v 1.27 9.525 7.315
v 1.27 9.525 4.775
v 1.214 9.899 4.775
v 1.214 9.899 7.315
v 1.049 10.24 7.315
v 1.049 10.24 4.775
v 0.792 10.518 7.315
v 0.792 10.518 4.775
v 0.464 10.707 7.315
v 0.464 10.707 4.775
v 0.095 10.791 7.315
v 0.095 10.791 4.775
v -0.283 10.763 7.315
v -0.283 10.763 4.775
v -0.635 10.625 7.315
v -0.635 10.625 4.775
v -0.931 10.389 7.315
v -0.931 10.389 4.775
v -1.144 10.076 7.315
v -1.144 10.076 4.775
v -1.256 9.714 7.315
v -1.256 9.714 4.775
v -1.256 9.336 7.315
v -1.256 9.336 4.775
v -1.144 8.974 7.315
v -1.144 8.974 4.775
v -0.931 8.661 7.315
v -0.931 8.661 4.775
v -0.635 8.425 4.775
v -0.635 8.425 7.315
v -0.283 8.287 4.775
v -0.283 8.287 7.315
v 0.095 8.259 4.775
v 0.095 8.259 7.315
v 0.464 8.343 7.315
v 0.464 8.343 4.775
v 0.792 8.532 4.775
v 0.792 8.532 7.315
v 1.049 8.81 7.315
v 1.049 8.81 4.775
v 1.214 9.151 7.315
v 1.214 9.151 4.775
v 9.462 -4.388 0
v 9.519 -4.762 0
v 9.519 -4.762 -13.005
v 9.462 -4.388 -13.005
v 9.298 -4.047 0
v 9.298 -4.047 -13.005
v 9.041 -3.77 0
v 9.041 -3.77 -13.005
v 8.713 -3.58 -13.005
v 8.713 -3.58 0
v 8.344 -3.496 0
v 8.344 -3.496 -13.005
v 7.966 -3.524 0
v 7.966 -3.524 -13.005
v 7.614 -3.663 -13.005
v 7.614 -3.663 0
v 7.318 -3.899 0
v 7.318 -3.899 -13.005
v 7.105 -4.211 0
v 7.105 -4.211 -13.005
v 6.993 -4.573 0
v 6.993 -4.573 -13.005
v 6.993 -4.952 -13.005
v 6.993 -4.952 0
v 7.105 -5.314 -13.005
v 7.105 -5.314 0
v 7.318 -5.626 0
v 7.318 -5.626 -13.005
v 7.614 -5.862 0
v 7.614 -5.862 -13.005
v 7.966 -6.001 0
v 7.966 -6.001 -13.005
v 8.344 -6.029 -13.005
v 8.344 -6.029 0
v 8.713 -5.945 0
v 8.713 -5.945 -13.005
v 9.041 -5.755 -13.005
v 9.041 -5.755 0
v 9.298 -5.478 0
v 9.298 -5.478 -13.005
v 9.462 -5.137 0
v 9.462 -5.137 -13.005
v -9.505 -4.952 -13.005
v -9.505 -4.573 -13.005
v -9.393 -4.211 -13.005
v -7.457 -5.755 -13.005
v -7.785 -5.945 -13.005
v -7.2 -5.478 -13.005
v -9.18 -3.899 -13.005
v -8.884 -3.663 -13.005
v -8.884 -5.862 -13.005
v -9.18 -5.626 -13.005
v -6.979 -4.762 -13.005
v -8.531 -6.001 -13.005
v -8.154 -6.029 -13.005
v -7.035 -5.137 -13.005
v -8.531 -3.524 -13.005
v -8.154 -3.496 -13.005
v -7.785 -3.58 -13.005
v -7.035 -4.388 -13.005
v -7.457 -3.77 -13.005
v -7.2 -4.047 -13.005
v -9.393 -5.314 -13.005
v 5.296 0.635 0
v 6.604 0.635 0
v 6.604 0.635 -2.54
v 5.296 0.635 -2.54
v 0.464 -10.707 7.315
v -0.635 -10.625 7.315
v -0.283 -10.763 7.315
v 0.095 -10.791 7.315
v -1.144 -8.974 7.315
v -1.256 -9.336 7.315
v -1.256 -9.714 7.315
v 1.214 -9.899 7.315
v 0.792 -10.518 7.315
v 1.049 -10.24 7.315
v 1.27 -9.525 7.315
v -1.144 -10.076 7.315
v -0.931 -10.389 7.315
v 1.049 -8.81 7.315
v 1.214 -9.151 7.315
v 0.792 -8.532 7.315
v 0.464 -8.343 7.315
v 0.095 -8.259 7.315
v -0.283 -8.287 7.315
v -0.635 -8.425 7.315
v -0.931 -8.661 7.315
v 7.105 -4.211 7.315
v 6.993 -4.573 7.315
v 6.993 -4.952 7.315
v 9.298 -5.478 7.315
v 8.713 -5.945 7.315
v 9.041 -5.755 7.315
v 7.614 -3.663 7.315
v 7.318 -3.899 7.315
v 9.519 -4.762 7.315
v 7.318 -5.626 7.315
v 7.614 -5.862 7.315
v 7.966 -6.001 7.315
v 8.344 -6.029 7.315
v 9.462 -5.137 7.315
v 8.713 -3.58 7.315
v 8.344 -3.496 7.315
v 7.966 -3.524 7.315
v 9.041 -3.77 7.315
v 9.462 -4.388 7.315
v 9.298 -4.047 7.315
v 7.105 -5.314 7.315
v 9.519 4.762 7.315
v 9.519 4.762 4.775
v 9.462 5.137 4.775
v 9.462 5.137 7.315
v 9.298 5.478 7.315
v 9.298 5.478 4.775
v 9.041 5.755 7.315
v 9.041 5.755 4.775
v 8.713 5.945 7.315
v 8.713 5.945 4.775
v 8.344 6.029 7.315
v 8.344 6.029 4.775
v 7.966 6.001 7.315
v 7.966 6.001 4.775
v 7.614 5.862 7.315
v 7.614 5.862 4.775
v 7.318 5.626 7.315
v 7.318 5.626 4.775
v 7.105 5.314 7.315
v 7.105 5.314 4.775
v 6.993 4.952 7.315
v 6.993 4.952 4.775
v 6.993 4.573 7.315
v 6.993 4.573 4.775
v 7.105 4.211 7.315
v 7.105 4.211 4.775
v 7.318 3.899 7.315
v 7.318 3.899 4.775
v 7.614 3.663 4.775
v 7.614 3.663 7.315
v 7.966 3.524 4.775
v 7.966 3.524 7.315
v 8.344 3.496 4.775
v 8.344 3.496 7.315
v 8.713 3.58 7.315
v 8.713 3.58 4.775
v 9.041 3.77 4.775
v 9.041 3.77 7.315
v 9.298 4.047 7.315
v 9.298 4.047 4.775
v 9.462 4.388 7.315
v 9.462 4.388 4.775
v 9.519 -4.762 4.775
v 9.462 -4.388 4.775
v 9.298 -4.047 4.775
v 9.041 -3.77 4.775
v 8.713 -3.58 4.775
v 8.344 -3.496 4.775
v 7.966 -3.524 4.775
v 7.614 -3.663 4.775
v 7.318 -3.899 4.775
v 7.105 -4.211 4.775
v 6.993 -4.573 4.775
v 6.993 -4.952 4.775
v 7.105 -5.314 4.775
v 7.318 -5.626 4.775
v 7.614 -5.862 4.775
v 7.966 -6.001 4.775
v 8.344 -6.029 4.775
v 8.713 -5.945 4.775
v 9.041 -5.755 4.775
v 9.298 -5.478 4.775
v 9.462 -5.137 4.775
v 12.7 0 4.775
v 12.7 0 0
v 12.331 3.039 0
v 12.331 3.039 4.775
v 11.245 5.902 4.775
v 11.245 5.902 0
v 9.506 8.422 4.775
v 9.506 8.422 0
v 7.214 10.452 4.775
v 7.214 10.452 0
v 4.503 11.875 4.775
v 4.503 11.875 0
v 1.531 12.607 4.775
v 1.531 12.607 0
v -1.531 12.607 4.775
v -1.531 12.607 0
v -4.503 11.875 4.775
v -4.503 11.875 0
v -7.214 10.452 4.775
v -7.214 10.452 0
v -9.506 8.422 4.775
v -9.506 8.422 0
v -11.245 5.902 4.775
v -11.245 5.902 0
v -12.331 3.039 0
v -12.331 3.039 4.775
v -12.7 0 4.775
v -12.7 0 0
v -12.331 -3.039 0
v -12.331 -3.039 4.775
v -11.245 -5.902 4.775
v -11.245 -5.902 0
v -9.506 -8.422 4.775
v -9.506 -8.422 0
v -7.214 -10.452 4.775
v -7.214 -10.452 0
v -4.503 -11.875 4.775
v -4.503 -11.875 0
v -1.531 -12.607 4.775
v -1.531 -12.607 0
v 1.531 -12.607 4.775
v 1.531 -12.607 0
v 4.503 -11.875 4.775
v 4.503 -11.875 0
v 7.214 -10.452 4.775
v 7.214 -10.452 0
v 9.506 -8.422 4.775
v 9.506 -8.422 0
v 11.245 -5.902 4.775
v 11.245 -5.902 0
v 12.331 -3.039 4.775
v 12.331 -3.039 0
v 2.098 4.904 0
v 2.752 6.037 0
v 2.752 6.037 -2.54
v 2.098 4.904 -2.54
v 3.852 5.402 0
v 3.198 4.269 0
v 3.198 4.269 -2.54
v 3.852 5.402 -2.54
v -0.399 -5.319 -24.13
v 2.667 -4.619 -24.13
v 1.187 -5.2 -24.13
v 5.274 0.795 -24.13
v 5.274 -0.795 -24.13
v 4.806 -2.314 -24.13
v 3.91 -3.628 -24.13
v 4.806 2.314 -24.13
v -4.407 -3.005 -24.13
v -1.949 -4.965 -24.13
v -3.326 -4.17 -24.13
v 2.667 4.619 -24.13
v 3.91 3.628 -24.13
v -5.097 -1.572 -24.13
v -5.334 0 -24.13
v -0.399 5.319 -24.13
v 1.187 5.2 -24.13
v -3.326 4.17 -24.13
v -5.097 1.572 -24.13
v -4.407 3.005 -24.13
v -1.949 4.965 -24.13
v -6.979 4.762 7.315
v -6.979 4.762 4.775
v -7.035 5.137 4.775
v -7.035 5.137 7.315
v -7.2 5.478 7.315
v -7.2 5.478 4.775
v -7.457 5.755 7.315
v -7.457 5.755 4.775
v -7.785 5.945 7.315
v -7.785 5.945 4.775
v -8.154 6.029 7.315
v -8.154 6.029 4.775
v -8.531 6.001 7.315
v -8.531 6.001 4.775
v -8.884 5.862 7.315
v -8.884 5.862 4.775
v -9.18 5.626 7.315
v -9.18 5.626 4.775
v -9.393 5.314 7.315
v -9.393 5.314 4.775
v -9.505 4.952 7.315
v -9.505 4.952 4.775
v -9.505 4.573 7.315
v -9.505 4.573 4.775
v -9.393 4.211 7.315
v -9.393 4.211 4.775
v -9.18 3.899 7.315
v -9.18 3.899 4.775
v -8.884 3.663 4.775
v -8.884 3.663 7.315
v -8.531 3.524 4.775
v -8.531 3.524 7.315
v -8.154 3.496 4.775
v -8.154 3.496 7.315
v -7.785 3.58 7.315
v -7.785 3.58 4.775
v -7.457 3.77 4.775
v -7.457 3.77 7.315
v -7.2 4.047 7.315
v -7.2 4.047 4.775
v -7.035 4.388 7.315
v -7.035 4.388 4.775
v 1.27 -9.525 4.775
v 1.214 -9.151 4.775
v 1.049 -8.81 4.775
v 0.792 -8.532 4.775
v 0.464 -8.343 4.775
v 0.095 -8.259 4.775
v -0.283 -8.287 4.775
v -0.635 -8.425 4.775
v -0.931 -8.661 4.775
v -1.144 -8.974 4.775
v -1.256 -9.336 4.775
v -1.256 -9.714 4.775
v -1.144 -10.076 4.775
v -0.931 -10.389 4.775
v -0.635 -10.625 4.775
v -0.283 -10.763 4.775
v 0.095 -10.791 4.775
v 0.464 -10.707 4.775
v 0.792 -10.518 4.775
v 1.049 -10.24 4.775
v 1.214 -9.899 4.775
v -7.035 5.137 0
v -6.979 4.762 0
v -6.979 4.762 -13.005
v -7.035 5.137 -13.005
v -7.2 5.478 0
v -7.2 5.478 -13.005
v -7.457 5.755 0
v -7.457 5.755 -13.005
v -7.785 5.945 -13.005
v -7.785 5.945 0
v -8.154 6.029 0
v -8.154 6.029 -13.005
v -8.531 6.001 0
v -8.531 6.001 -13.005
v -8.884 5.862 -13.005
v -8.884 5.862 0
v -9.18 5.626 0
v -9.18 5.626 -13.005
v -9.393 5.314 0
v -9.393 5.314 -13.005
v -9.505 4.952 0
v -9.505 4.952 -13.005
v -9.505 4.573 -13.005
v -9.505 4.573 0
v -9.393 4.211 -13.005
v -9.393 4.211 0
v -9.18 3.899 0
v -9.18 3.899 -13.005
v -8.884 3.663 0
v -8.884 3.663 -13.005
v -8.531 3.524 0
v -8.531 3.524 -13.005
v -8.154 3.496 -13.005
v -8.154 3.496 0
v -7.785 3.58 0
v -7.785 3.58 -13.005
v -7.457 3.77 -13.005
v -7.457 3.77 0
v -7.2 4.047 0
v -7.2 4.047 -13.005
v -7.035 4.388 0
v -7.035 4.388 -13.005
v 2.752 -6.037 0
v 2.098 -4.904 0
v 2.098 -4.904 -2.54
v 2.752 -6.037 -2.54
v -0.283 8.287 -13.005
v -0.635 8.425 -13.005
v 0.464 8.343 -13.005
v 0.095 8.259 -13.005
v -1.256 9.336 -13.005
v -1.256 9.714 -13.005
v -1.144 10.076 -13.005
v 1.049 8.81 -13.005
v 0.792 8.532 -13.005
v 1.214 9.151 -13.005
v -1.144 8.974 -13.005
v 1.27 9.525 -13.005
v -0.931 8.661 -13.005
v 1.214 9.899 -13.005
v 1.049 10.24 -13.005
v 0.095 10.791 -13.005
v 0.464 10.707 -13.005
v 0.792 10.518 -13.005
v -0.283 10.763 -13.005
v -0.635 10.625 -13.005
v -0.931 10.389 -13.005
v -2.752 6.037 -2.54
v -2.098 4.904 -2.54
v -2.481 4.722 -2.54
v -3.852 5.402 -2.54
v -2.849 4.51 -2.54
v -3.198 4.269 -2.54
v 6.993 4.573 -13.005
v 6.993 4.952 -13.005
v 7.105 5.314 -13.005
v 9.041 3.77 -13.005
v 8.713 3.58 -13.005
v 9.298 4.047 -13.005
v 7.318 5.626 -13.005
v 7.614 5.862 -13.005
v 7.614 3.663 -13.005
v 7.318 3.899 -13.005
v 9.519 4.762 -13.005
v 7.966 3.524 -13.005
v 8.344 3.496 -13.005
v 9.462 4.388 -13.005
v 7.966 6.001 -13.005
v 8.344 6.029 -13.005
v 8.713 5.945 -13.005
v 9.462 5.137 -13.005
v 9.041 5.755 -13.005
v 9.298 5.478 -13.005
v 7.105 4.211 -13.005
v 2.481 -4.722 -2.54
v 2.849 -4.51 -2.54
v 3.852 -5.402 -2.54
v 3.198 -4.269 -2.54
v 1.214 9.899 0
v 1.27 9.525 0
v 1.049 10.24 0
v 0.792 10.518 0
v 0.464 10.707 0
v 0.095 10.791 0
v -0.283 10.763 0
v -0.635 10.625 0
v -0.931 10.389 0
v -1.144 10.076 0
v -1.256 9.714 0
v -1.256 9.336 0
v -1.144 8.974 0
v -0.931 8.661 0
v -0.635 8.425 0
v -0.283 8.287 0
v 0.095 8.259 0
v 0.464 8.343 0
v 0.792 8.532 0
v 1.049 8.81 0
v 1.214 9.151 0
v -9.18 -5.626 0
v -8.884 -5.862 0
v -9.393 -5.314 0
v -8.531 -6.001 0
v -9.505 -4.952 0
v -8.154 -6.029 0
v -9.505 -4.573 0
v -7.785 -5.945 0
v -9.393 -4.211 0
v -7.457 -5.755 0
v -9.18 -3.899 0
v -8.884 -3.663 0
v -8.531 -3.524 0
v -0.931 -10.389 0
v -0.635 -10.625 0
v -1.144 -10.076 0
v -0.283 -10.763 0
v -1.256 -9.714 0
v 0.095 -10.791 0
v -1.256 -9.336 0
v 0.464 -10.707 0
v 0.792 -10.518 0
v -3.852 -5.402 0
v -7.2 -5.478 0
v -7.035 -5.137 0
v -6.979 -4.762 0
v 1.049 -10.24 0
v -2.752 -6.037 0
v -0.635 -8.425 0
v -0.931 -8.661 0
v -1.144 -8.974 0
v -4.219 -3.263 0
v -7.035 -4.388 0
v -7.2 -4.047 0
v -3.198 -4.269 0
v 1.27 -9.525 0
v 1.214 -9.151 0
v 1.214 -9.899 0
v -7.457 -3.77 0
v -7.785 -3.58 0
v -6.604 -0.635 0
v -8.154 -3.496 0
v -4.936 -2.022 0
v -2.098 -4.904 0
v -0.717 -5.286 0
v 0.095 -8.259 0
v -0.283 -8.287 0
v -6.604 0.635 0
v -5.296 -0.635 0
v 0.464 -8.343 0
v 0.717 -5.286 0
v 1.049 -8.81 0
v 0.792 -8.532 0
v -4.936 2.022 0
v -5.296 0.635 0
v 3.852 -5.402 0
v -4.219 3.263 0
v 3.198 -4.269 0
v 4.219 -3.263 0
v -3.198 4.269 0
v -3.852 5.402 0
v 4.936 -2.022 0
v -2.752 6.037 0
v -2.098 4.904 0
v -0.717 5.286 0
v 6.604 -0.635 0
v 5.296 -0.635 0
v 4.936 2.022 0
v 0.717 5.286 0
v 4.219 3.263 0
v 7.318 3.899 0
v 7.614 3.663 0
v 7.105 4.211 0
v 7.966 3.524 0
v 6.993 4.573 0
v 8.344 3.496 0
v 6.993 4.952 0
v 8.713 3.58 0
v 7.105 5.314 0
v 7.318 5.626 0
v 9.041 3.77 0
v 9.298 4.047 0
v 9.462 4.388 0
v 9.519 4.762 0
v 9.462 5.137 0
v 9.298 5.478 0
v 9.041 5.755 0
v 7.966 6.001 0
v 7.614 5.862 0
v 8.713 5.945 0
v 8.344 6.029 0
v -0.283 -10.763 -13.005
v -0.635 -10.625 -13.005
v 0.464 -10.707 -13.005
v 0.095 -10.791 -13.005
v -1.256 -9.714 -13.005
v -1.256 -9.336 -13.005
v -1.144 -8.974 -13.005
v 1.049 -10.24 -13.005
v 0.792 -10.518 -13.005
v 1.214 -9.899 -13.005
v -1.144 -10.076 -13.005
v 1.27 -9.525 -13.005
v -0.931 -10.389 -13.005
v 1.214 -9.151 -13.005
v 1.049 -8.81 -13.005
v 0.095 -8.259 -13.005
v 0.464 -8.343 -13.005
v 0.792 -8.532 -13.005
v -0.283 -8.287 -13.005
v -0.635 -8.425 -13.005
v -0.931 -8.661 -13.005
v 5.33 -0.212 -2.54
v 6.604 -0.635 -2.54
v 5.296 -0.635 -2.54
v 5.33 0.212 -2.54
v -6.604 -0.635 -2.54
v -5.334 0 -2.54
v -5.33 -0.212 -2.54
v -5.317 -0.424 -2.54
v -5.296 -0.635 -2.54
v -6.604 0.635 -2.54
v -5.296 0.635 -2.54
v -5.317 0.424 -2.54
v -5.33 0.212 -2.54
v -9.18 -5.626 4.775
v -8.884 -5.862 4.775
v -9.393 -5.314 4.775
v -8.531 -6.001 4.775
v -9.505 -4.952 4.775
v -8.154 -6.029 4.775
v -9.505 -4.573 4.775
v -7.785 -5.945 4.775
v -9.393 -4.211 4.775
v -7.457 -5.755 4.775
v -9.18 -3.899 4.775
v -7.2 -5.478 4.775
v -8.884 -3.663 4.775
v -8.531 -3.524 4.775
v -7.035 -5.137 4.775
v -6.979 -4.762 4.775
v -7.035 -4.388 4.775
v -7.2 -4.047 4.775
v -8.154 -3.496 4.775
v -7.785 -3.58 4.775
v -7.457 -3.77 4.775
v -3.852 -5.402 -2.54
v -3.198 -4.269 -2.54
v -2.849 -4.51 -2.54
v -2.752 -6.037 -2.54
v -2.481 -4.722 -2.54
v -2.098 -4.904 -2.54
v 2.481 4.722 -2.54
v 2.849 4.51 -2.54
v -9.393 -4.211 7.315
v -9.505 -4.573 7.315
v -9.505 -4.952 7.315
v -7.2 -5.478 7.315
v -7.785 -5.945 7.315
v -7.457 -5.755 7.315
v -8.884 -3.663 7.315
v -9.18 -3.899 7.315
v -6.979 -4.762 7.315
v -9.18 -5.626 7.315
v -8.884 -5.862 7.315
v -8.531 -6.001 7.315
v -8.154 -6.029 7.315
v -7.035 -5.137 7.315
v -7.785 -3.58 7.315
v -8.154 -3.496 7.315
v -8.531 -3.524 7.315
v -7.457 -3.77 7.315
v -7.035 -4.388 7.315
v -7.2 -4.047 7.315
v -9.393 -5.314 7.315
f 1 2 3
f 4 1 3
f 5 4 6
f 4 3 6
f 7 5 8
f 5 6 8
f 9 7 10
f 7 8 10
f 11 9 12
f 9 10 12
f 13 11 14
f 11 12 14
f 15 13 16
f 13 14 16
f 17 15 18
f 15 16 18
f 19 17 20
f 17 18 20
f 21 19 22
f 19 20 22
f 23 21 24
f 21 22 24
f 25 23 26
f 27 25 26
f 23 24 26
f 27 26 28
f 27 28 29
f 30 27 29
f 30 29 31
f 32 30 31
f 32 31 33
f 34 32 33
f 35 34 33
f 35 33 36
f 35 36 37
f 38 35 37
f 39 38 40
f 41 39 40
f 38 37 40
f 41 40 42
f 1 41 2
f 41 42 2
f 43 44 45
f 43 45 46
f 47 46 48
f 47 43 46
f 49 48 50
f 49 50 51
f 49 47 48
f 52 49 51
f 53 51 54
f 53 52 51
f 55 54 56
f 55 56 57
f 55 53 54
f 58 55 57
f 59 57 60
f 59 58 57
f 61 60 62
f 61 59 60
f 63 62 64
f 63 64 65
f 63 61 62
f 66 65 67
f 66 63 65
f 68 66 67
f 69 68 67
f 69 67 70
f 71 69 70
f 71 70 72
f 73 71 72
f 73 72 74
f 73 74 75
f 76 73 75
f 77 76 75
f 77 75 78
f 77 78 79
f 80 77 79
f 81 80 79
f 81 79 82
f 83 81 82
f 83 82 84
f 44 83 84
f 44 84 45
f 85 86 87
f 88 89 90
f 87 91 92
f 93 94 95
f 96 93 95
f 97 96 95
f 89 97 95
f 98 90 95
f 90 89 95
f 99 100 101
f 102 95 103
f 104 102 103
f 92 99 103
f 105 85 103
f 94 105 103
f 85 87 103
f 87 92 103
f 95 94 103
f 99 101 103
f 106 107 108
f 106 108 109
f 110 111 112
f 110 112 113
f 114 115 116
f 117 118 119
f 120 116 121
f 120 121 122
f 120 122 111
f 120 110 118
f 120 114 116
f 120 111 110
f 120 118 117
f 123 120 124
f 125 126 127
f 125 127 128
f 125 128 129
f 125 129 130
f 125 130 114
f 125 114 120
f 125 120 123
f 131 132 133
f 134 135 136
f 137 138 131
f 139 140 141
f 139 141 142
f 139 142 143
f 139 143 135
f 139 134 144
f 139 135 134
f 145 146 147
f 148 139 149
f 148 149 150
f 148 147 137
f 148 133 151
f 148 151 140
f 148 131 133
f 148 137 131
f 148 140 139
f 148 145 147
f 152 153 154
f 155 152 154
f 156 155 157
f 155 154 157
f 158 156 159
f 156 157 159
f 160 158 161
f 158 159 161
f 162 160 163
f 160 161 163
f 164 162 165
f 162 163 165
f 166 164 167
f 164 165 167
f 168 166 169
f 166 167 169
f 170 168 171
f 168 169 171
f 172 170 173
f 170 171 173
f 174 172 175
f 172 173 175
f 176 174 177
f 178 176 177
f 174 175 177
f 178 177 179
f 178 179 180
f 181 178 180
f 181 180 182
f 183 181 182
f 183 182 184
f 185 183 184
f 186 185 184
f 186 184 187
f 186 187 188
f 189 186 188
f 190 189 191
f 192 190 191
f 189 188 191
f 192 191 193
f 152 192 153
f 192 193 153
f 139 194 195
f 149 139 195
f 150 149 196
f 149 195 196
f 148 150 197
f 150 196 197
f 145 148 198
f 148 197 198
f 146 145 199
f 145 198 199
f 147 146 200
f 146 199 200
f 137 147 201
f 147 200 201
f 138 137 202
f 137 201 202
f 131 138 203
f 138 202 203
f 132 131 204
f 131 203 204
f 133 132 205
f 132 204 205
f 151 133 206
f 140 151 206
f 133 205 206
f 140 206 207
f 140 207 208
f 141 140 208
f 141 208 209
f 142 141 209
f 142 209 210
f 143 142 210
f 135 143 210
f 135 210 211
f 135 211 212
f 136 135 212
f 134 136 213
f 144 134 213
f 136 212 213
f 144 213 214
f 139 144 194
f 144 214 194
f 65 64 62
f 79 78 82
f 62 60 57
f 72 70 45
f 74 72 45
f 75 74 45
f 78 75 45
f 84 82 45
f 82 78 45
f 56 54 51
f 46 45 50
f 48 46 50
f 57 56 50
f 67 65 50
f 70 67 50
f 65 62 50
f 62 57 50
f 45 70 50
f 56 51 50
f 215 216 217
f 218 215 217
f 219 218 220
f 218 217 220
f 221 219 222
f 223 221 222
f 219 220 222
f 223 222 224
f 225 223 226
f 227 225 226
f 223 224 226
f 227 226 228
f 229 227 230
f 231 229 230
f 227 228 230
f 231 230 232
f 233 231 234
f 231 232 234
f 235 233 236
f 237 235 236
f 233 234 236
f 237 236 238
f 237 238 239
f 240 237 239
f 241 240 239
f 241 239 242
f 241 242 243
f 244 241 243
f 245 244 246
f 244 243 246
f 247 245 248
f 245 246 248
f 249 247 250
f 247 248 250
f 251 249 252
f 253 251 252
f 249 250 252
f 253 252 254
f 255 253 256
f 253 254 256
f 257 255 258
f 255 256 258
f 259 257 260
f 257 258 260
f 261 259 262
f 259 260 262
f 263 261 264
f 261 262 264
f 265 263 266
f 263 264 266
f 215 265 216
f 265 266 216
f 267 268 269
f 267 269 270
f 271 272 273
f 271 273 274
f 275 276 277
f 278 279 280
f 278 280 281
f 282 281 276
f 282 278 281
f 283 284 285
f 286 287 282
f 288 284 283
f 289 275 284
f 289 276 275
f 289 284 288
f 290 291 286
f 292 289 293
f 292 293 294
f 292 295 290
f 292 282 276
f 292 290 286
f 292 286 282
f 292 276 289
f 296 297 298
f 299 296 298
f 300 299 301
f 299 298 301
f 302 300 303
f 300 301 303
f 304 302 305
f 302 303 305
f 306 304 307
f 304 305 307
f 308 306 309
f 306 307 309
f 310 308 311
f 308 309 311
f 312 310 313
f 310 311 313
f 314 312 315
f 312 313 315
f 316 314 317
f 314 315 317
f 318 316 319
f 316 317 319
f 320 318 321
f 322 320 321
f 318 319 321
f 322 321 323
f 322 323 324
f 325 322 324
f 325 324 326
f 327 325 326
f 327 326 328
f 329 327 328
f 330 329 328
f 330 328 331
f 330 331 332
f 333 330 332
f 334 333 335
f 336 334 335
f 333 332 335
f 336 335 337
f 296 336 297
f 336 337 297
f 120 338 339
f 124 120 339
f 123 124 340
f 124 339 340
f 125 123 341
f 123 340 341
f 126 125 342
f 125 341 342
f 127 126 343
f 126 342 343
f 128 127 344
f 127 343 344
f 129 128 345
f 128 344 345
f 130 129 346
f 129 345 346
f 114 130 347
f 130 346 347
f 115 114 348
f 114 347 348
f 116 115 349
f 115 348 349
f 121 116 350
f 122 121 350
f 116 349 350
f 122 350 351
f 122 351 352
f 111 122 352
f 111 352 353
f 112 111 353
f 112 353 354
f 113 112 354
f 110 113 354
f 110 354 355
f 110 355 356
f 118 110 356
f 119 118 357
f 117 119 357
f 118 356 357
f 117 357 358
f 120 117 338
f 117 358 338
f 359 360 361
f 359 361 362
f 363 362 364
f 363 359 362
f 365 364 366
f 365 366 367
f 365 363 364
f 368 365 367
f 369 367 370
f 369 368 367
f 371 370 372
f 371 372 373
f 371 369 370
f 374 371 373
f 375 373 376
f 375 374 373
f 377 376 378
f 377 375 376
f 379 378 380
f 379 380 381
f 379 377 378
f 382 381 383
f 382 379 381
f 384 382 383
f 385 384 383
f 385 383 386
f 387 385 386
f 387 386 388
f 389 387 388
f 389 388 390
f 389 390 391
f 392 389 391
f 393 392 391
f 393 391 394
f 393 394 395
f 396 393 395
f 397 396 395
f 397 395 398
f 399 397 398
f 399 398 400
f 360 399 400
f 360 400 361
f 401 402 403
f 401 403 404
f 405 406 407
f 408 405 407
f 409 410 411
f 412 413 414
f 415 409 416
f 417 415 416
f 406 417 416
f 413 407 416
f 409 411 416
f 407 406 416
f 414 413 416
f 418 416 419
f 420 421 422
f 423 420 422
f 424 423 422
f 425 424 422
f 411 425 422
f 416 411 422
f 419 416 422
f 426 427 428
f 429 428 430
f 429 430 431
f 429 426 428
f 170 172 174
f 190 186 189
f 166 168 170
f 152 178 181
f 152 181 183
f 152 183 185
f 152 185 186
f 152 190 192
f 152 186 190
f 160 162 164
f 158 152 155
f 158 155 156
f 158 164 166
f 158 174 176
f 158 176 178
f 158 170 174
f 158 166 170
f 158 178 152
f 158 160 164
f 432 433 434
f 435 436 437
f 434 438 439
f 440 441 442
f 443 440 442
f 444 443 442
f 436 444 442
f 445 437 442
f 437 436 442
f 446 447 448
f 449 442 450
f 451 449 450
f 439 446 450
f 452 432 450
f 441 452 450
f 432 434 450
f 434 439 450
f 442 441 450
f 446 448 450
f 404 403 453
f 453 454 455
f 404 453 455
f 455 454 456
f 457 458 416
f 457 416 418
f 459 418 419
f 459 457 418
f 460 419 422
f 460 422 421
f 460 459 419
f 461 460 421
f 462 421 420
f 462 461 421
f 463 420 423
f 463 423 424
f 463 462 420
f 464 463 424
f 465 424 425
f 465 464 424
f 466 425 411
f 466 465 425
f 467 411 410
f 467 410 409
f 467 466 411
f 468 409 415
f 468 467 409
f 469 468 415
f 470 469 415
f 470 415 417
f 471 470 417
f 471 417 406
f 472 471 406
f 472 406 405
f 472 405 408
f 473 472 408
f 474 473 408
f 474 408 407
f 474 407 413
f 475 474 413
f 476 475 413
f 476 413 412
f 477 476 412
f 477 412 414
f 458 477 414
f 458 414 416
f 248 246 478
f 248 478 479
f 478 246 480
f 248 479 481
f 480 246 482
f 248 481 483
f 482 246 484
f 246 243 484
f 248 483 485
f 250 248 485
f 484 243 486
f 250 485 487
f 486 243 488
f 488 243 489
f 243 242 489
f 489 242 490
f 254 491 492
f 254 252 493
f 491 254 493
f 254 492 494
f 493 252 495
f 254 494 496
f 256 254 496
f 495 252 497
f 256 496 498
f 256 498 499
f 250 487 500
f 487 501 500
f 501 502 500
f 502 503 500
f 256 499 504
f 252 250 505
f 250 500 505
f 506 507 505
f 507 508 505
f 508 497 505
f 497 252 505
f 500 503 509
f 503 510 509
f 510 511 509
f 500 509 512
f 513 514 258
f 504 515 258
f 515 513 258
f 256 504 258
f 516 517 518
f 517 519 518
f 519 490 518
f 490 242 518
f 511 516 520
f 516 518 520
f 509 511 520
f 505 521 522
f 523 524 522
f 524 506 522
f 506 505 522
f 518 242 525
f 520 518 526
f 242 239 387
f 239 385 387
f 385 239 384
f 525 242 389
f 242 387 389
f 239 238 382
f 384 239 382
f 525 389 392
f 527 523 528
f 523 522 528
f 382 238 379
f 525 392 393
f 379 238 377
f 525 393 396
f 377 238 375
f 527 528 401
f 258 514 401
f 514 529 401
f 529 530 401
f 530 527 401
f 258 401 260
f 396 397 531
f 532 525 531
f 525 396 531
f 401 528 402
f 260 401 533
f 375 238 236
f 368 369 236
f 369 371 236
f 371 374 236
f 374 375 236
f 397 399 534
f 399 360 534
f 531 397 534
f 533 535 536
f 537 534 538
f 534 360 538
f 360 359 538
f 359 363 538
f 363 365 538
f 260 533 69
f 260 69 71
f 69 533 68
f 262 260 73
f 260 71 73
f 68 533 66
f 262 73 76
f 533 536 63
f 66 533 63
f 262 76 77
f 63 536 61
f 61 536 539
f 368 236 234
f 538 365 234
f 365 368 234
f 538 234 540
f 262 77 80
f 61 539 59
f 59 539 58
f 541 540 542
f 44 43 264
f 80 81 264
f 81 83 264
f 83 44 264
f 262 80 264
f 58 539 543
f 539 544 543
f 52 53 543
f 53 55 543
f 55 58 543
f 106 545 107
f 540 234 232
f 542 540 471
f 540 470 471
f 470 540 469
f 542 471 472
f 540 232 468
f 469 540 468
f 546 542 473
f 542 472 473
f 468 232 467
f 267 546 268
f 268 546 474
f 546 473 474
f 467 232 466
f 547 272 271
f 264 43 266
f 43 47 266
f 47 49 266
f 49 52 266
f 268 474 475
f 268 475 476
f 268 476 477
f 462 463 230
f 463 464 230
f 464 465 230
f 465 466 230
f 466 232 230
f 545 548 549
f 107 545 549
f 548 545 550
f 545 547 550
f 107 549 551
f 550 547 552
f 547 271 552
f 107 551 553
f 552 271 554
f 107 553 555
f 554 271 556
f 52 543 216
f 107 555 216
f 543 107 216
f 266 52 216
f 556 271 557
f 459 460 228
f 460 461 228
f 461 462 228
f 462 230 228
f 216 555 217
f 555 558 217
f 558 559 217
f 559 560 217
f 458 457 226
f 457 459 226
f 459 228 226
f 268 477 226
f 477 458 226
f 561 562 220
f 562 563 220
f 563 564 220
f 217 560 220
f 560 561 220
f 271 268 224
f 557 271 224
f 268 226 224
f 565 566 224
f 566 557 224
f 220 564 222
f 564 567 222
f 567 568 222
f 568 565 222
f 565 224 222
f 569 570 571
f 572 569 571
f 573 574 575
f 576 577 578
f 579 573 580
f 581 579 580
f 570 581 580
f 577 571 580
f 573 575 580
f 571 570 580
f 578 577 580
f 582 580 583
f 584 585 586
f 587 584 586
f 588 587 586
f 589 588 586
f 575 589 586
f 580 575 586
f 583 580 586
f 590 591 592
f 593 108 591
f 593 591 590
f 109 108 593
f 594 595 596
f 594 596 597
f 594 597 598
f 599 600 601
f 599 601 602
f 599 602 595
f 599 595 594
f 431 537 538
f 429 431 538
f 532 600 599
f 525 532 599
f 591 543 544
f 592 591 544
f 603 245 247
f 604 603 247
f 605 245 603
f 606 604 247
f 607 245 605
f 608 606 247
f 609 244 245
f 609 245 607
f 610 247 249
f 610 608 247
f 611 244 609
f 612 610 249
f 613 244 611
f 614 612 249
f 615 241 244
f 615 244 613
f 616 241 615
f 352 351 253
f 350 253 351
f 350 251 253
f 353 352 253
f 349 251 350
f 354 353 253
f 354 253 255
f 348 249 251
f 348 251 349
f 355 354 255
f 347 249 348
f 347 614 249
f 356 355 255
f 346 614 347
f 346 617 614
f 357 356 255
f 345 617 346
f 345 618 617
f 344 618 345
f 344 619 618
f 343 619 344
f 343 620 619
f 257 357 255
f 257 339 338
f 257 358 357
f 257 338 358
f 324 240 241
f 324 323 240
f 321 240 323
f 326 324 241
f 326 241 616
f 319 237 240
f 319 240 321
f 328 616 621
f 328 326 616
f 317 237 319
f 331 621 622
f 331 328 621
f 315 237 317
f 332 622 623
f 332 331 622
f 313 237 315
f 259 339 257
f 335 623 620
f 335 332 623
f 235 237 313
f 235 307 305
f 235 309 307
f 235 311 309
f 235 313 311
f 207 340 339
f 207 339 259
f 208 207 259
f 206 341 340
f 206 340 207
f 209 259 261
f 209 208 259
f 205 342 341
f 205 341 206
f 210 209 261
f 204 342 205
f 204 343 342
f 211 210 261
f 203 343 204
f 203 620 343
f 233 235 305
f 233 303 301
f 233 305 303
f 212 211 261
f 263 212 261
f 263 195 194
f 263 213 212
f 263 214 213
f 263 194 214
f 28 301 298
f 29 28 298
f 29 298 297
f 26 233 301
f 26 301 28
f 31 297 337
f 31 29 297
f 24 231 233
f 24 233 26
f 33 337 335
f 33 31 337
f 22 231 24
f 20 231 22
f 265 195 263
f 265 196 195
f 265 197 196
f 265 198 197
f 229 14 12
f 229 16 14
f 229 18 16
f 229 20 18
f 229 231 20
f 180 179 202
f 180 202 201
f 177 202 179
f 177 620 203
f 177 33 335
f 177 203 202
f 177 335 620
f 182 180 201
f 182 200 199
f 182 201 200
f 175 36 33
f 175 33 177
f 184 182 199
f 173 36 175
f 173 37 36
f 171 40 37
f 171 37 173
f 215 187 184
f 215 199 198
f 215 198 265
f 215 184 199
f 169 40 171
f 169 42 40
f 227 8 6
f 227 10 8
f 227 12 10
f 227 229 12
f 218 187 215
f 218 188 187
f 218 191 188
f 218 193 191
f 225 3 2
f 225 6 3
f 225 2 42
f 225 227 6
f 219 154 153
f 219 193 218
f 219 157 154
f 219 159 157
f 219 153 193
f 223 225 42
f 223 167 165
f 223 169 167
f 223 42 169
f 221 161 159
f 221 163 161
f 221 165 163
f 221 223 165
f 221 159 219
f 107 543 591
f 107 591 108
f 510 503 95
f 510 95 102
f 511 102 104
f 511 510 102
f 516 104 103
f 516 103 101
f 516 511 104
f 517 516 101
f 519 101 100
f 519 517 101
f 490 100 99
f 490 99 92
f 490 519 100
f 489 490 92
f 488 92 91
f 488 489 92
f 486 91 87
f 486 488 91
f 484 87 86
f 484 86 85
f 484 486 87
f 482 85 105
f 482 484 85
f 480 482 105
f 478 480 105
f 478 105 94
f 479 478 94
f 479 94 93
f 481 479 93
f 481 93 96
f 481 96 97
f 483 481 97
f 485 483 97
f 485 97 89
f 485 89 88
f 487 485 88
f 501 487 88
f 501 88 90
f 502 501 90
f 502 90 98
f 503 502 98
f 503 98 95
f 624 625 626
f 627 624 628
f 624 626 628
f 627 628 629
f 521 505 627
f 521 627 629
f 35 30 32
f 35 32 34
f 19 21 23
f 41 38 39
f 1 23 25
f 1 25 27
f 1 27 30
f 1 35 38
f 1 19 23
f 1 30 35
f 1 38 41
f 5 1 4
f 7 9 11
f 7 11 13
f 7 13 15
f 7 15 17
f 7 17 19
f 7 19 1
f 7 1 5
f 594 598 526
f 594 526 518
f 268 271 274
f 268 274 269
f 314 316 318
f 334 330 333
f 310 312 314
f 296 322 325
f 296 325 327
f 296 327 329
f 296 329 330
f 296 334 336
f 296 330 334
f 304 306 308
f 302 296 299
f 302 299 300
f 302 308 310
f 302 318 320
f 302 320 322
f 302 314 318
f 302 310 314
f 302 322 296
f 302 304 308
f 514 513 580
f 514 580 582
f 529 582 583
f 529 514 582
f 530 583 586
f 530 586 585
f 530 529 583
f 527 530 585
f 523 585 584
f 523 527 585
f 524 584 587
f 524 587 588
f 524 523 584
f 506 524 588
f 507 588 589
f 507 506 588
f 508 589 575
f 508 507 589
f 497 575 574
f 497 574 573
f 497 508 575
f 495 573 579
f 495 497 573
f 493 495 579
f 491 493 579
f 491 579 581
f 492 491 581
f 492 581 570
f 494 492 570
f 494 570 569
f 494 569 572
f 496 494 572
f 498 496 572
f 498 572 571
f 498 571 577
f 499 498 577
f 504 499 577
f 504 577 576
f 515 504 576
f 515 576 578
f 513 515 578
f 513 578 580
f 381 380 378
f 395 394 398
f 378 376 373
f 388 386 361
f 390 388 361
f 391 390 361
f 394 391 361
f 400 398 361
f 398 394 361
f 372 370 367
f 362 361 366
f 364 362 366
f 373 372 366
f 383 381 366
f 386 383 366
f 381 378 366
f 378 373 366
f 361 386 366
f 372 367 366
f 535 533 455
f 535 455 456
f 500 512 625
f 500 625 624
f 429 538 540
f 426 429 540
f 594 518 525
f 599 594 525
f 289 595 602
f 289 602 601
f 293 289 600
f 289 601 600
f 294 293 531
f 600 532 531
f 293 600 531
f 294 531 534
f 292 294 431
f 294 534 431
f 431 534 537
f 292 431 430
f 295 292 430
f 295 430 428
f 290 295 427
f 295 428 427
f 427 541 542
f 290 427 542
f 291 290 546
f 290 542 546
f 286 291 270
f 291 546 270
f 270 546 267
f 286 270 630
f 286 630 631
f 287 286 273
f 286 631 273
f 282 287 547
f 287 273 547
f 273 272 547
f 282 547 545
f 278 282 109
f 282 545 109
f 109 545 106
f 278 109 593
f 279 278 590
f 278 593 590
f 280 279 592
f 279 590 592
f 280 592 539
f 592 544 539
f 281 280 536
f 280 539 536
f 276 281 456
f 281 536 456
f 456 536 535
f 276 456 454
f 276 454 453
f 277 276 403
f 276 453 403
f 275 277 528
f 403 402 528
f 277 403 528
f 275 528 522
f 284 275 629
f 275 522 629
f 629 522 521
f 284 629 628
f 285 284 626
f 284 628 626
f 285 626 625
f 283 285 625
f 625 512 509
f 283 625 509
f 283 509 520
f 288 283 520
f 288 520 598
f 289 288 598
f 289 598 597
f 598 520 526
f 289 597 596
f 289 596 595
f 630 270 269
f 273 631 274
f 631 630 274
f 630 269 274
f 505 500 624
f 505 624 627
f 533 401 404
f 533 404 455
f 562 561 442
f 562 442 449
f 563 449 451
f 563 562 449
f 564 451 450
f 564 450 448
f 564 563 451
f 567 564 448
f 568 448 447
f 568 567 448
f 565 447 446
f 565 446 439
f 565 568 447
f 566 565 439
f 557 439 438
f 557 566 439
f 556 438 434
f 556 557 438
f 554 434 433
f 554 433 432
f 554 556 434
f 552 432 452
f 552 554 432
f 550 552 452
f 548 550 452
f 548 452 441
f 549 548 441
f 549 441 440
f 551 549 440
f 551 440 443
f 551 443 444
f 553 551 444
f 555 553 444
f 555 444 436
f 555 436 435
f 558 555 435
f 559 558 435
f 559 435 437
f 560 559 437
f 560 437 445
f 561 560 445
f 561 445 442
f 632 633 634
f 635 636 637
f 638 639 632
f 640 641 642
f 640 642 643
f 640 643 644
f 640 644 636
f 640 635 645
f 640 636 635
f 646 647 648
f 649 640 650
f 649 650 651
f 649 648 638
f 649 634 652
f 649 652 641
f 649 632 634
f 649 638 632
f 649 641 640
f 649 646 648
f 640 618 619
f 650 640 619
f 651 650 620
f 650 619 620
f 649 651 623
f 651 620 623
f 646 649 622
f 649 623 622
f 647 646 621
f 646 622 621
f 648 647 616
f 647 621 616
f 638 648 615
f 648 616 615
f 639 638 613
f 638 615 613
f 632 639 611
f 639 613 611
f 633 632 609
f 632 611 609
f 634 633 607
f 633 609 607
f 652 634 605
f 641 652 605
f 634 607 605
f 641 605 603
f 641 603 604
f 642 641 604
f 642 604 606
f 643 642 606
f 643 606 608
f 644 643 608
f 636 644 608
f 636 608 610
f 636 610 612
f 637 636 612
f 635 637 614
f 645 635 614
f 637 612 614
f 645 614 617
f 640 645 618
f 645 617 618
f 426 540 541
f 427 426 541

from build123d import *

# Parameters (mm, degrees)
SKETCH1_R                = 12.7
BOSS_EXTRUDE1_DEPTH      = 4.7752
SKETCH2_R                = 5.334
BOSS_EXTRUDE2_DEPTH      = 24.13
SKETCH3_R                = 1.27
BOSS_EXTRUDE3_DEPTH      = 2.54
BOSS_EXTRUDE3_DEPTH_BACK = 17.78
SKETCH6_W                = 2.54
SKETCH6_H                = 1.27
BOSS_EXTRUDE4_DEPTH      = 2.54


with BuildPart() as part:
    # Sketch1 → Boss-Extrude1 (new body)
    with BuildSketch(Plane.XY):
        Circle(SKETCH1_R)
    extrude(amount=BOSS_EXTRUDE1_DEPTH)

    # Sketch2 → Boss-Extrude2 (add)
    with BuildSketch(Plane(origin=(0, 0, 0), x_dir=(-1, 0, 0), z_dir=(0, 0, -1))):
        Circle(SKETCH2_R)
    extrude(amount=BOSS_EXTRUDE2_DEPTH)

    # Sketch3 → Boss-Extrude3 (add, two sides)
    with BuildSketch(Plane.XY.offset(4.7752)) as boss_extrude3_sk:
        with Locations((0, 9.525)):
            Circle(SKETCH3_R)
        with Locations((8.248891971, 4.7625)):
            Circle(SKETCH3_R)
        with Locations((8.248891971, -4.7625)):
            Circle(SKETCH3_R)
        with Locations((0, -9.525)):
            Circle(SKETCH3_R)
        with Locations((-8.248891971, -4.7625)):
            Circle(SKETCH3_R)
        with Locations((-8.248891971, 4.7625)):
            Circle(SKETCH3_R)
    extrude(amount=BOSS_EXTRUDE3_DEPTH)
    extrude(boss_extrude3_sk.sketch, amount=-BOSS_EXTRUDE3_DEPTH_BACK)

    # Sketch6 → Boss-Extrude4 (add)
    with BuildSketch(Plane(origin=(0, 0, 0), x_dir=(-1, 0, 0), z_dir=(0, 0, -1))):
        Polygon((1.482073869, 3.837027241), (2.581926131, 3.202027241), (3.851926131, 5.401731767), (2.752073869, 6.036731767), align=None)
        with Locations((5.334, 0)):
            Rectangle(SKETCH6_W, SKETCH6_H)
        Polygon((2.581926131, -3.202027241), (3.851926131, -5.401731767), (2.752073869, -6.036731767), (1.482073869, -3.837027241), align=None)
        Polygon((-1.482073869, -3.837027241), (-2.752073869, -6.036731767), (-3.851926131, -5.401731767), (-2.581926131, -3.202027241), align=None)
        with Locations((-5.334, 0)):
            Rectangle(SKETCH6_W, SKETCH6_H)
        Polygon((-2.581926131, 3.202027241), (-3.851926131, 5.401731767), (-2.752073869, 6.036731767), (-1.482073869, 3.837027241), align=None)
    extrude(amount=BOSS_EXTRUDE4_DEPTH)


solid = part.part
